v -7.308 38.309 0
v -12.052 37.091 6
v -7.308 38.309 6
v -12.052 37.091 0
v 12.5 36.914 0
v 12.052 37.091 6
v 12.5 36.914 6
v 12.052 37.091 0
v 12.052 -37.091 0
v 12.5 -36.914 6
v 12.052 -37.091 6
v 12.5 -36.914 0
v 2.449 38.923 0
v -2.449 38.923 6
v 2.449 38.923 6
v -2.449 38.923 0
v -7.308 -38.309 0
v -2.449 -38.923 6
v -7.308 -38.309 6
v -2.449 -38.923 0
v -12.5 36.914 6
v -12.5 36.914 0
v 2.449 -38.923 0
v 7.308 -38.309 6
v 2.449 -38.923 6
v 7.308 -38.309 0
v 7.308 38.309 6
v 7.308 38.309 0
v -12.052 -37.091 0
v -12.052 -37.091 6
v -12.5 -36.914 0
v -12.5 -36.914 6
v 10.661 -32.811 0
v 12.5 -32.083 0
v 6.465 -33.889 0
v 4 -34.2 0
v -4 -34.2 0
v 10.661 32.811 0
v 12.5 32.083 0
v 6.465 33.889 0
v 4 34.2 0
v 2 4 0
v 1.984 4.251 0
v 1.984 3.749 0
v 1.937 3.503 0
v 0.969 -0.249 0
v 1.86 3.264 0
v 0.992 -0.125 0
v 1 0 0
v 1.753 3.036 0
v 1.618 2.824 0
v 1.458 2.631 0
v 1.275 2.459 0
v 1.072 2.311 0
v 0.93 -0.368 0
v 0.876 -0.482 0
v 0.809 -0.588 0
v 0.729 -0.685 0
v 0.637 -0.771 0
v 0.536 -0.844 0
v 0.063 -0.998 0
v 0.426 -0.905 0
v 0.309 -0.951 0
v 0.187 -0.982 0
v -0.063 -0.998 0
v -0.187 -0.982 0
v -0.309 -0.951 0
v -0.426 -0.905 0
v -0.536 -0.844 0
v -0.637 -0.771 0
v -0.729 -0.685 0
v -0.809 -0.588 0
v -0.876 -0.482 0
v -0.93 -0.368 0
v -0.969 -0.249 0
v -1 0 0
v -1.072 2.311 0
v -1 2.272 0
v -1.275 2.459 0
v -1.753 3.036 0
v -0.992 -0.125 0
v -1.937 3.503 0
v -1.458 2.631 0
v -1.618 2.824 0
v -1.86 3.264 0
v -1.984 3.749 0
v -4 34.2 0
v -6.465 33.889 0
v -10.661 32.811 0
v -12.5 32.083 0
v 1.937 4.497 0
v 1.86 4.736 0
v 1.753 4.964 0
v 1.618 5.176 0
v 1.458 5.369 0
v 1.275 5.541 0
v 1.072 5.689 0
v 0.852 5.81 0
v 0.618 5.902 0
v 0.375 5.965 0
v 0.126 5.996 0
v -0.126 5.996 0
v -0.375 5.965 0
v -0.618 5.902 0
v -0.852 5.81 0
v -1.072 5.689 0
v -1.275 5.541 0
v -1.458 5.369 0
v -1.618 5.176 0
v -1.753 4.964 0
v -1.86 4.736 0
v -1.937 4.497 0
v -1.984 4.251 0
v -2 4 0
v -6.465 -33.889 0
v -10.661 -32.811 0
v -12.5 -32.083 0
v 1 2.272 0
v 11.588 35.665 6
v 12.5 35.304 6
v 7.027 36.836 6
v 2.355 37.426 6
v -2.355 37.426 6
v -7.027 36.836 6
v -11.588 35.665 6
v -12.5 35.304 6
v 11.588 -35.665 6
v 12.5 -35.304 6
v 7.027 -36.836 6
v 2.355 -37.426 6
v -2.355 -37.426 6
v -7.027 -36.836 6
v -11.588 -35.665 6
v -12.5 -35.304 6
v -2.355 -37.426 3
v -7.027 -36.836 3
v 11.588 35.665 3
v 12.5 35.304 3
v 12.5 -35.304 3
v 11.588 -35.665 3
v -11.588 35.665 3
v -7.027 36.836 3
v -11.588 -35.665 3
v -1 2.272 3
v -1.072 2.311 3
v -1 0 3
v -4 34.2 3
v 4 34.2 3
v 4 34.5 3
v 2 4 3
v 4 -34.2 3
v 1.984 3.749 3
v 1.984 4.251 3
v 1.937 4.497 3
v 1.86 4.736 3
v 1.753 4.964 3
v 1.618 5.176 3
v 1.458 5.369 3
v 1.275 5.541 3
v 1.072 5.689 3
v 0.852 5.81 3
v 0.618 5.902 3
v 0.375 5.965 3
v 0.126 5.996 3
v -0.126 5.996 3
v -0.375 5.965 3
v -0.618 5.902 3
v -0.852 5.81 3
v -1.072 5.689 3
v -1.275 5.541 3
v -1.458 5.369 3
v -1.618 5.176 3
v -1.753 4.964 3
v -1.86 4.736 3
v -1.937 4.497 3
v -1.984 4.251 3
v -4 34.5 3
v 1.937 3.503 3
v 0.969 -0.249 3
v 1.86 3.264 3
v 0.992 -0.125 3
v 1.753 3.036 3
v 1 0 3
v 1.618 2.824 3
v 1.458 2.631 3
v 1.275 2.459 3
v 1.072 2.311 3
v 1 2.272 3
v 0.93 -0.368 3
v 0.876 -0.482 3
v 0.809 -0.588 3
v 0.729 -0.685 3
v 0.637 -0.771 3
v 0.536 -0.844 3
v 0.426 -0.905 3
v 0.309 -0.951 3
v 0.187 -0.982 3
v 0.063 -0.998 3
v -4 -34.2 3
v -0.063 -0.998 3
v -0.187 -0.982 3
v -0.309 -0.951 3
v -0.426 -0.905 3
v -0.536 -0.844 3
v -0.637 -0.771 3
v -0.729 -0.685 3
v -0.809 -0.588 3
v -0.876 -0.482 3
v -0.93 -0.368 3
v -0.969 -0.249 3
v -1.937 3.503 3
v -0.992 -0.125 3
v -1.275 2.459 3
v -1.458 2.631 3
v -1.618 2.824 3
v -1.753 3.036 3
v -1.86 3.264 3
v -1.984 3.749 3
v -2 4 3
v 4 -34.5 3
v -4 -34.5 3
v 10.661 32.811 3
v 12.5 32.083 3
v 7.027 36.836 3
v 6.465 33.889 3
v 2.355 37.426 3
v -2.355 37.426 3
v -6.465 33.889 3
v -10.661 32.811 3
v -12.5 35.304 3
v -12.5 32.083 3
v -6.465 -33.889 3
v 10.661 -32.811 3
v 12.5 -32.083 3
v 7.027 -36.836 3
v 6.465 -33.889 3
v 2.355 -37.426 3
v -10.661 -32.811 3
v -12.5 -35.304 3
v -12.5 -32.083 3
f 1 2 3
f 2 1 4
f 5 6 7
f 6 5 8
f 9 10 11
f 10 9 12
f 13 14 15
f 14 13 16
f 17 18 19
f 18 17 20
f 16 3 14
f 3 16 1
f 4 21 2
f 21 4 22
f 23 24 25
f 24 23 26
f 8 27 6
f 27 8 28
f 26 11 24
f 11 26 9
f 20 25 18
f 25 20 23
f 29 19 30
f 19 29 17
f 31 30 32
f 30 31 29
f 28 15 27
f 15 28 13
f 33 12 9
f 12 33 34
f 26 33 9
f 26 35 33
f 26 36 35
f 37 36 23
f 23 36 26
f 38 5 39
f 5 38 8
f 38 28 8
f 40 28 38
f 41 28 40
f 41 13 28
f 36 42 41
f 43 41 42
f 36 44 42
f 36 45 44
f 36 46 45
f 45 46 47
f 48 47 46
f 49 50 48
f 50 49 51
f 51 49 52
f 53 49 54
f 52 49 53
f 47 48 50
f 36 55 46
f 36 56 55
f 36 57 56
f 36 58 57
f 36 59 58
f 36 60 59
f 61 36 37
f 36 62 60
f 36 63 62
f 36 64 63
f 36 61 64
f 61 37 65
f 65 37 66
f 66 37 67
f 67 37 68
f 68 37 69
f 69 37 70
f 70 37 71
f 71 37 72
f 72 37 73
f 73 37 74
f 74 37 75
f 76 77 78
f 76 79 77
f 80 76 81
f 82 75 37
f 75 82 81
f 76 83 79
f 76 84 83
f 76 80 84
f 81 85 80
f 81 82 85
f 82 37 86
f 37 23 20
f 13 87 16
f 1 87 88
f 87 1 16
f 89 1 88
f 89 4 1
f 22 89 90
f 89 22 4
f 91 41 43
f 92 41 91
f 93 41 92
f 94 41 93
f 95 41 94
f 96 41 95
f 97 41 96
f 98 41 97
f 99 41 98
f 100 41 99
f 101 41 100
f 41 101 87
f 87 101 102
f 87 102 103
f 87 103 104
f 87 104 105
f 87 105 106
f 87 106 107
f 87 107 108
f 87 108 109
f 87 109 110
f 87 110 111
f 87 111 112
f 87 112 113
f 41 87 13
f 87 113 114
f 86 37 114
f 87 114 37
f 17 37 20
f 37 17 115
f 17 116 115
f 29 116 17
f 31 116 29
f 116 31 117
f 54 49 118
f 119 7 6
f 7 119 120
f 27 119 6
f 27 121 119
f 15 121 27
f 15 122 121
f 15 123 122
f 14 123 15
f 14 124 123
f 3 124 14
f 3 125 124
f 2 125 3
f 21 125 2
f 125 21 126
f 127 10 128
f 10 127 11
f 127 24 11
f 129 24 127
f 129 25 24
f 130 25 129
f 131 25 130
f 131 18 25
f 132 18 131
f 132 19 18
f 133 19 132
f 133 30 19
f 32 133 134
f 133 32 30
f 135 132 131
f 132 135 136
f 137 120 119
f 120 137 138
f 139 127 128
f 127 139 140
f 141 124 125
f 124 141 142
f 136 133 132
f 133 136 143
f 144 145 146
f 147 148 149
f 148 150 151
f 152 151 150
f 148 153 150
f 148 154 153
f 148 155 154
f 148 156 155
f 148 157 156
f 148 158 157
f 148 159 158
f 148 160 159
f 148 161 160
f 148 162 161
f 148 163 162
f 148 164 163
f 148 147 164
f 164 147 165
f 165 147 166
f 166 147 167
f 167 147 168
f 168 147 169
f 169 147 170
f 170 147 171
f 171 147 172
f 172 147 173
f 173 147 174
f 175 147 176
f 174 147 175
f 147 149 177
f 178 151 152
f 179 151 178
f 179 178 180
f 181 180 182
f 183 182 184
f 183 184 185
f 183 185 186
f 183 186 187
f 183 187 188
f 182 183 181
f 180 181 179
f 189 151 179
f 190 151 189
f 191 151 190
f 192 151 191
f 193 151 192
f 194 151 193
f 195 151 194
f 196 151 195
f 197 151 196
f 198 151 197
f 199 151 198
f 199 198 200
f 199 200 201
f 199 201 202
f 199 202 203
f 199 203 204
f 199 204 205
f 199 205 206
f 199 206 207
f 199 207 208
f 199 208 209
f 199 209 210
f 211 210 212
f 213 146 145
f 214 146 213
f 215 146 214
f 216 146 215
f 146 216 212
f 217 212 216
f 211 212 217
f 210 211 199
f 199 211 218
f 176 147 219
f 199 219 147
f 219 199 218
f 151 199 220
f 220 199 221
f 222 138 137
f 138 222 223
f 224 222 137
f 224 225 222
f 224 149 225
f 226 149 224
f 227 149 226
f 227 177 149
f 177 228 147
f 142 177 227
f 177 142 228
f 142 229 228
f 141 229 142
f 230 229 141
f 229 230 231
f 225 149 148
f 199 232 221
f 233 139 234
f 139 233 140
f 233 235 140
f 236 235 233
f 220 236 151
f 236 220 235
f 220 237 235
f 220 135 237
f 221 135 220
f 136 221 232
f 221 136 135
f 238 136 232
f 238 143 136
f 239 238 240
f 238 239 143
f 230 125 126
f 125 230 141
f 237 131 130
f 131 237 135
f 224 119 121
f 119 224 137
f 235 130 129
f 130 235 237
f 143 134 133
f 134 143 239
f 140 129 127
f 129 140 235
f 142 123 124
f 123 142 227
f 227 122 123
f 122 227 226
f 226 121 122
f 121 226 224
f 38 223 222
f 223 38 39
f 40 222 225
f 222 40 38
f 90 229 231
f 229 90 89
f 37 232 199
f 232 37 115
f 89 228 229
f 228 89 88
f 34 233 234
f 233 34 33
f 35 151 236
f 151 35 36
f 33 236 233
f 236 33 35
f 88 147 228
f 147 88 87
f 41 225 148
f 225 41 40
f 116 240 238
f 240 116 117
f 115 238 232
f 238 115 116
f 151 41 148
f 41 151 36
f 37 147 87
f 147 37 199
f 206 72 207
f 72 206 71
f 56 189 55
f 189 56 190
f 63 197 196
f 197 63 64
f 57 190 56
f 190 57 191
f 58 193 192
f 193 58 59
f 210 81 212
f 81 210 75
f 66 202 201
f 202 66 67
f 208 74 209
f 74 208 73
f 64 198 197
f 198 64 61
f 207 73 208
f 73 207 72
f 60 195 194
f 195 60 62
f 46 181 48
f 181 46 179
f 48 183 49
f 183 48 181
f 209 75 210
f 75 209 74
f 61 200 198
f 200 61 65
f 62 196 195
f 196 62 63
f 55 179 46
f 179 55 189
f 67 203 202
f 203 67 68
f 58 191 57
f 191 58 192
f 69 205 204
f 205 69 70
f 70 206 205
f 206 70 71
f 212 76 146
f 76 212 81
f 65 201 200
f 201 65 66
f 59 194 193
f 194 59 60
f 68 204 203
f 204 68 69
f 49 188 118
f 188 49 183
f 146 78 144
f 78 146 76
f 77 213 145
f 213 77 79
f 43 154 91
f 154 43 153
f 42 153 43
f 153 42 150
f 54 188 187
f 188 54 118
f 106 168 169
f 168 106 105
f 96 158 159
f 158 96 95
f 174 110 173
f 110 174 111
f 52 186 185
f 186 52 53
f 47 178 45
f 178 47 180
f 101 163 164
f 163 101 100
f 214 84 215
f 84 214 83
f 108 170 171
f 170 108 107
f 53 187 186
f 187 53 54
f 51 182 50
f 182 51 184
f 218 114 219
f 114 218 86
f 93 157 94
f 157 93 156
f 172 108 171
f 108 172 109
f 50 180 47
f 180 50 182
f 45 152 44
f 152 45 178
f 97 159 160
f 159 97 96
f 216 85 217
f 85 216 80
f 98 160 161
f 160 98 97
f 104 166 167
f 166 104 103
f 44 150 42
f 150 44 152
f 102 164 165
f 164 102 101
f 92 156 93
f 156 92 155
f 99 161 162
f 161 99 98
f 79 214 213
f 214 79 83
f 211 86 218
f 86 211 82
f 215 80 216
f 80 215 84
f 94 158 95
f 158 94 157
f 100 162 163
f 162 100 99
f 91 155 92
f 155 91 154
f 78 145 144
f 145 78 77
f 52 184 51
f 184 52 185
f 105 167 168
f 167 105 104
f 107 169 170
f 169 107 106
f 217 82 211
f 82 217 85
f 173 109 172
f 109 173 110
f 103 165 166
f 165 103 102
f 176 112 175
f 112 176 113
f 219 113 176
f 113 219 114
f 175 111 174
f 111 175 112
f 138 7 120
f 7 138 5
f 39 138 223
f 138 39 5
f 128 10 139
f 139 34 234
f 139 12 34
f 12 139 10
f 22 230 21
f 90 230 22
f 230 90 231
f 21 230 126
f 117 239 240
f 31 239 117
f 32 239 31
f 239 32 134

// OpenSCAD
outdiameter = 75;
thickness = 3;
rimthickness = 6;

wickDiam = 2;
middleWidth = 8;
wickOpenningLength = 4;

$fn=50;


difference() {
    union() {
        difference() {
            cylinder(d=outdiameter + thickness,h=rimthickness);

            translate([0, 0, thickness]) cylinder(d=outdiameter,h=(rimthickness - thickness));

            cylinder(d=outdiameter - rimthickness,h=thickness);
        }

        difference() {
            translate([-middleWidth /2, -(outdiameter - rimthickness) / 2, 0]) cube([middleWidth, outdiameter - rimthickness, thickness]);

            cylinder(d=wickDiam,h=thickness);

            translate([-wickDiam / 2, 0, 0]) {
                cube([wickDiam, wickOpenningLength, thickness]);
            }
            
            translate([0, wickOpenningLength, 0]) cylinder(d=wickDiam +2,h=thickness);
        }
    }

    translate([outdiameter / 6, -(outdiameter + rimthickness) / 2, 0])  cube([outdiameter + rimthickness, outdiameter + rimthickness, rimthickness]);
    translate([-(outdiameter / 6 + outdiameter + rimthickness), -(outdiameter + rimthickness) / 2, 0])  cube([outdiameter + rimthickness, outdiameter + rimthickness, rimthickness]);
}
